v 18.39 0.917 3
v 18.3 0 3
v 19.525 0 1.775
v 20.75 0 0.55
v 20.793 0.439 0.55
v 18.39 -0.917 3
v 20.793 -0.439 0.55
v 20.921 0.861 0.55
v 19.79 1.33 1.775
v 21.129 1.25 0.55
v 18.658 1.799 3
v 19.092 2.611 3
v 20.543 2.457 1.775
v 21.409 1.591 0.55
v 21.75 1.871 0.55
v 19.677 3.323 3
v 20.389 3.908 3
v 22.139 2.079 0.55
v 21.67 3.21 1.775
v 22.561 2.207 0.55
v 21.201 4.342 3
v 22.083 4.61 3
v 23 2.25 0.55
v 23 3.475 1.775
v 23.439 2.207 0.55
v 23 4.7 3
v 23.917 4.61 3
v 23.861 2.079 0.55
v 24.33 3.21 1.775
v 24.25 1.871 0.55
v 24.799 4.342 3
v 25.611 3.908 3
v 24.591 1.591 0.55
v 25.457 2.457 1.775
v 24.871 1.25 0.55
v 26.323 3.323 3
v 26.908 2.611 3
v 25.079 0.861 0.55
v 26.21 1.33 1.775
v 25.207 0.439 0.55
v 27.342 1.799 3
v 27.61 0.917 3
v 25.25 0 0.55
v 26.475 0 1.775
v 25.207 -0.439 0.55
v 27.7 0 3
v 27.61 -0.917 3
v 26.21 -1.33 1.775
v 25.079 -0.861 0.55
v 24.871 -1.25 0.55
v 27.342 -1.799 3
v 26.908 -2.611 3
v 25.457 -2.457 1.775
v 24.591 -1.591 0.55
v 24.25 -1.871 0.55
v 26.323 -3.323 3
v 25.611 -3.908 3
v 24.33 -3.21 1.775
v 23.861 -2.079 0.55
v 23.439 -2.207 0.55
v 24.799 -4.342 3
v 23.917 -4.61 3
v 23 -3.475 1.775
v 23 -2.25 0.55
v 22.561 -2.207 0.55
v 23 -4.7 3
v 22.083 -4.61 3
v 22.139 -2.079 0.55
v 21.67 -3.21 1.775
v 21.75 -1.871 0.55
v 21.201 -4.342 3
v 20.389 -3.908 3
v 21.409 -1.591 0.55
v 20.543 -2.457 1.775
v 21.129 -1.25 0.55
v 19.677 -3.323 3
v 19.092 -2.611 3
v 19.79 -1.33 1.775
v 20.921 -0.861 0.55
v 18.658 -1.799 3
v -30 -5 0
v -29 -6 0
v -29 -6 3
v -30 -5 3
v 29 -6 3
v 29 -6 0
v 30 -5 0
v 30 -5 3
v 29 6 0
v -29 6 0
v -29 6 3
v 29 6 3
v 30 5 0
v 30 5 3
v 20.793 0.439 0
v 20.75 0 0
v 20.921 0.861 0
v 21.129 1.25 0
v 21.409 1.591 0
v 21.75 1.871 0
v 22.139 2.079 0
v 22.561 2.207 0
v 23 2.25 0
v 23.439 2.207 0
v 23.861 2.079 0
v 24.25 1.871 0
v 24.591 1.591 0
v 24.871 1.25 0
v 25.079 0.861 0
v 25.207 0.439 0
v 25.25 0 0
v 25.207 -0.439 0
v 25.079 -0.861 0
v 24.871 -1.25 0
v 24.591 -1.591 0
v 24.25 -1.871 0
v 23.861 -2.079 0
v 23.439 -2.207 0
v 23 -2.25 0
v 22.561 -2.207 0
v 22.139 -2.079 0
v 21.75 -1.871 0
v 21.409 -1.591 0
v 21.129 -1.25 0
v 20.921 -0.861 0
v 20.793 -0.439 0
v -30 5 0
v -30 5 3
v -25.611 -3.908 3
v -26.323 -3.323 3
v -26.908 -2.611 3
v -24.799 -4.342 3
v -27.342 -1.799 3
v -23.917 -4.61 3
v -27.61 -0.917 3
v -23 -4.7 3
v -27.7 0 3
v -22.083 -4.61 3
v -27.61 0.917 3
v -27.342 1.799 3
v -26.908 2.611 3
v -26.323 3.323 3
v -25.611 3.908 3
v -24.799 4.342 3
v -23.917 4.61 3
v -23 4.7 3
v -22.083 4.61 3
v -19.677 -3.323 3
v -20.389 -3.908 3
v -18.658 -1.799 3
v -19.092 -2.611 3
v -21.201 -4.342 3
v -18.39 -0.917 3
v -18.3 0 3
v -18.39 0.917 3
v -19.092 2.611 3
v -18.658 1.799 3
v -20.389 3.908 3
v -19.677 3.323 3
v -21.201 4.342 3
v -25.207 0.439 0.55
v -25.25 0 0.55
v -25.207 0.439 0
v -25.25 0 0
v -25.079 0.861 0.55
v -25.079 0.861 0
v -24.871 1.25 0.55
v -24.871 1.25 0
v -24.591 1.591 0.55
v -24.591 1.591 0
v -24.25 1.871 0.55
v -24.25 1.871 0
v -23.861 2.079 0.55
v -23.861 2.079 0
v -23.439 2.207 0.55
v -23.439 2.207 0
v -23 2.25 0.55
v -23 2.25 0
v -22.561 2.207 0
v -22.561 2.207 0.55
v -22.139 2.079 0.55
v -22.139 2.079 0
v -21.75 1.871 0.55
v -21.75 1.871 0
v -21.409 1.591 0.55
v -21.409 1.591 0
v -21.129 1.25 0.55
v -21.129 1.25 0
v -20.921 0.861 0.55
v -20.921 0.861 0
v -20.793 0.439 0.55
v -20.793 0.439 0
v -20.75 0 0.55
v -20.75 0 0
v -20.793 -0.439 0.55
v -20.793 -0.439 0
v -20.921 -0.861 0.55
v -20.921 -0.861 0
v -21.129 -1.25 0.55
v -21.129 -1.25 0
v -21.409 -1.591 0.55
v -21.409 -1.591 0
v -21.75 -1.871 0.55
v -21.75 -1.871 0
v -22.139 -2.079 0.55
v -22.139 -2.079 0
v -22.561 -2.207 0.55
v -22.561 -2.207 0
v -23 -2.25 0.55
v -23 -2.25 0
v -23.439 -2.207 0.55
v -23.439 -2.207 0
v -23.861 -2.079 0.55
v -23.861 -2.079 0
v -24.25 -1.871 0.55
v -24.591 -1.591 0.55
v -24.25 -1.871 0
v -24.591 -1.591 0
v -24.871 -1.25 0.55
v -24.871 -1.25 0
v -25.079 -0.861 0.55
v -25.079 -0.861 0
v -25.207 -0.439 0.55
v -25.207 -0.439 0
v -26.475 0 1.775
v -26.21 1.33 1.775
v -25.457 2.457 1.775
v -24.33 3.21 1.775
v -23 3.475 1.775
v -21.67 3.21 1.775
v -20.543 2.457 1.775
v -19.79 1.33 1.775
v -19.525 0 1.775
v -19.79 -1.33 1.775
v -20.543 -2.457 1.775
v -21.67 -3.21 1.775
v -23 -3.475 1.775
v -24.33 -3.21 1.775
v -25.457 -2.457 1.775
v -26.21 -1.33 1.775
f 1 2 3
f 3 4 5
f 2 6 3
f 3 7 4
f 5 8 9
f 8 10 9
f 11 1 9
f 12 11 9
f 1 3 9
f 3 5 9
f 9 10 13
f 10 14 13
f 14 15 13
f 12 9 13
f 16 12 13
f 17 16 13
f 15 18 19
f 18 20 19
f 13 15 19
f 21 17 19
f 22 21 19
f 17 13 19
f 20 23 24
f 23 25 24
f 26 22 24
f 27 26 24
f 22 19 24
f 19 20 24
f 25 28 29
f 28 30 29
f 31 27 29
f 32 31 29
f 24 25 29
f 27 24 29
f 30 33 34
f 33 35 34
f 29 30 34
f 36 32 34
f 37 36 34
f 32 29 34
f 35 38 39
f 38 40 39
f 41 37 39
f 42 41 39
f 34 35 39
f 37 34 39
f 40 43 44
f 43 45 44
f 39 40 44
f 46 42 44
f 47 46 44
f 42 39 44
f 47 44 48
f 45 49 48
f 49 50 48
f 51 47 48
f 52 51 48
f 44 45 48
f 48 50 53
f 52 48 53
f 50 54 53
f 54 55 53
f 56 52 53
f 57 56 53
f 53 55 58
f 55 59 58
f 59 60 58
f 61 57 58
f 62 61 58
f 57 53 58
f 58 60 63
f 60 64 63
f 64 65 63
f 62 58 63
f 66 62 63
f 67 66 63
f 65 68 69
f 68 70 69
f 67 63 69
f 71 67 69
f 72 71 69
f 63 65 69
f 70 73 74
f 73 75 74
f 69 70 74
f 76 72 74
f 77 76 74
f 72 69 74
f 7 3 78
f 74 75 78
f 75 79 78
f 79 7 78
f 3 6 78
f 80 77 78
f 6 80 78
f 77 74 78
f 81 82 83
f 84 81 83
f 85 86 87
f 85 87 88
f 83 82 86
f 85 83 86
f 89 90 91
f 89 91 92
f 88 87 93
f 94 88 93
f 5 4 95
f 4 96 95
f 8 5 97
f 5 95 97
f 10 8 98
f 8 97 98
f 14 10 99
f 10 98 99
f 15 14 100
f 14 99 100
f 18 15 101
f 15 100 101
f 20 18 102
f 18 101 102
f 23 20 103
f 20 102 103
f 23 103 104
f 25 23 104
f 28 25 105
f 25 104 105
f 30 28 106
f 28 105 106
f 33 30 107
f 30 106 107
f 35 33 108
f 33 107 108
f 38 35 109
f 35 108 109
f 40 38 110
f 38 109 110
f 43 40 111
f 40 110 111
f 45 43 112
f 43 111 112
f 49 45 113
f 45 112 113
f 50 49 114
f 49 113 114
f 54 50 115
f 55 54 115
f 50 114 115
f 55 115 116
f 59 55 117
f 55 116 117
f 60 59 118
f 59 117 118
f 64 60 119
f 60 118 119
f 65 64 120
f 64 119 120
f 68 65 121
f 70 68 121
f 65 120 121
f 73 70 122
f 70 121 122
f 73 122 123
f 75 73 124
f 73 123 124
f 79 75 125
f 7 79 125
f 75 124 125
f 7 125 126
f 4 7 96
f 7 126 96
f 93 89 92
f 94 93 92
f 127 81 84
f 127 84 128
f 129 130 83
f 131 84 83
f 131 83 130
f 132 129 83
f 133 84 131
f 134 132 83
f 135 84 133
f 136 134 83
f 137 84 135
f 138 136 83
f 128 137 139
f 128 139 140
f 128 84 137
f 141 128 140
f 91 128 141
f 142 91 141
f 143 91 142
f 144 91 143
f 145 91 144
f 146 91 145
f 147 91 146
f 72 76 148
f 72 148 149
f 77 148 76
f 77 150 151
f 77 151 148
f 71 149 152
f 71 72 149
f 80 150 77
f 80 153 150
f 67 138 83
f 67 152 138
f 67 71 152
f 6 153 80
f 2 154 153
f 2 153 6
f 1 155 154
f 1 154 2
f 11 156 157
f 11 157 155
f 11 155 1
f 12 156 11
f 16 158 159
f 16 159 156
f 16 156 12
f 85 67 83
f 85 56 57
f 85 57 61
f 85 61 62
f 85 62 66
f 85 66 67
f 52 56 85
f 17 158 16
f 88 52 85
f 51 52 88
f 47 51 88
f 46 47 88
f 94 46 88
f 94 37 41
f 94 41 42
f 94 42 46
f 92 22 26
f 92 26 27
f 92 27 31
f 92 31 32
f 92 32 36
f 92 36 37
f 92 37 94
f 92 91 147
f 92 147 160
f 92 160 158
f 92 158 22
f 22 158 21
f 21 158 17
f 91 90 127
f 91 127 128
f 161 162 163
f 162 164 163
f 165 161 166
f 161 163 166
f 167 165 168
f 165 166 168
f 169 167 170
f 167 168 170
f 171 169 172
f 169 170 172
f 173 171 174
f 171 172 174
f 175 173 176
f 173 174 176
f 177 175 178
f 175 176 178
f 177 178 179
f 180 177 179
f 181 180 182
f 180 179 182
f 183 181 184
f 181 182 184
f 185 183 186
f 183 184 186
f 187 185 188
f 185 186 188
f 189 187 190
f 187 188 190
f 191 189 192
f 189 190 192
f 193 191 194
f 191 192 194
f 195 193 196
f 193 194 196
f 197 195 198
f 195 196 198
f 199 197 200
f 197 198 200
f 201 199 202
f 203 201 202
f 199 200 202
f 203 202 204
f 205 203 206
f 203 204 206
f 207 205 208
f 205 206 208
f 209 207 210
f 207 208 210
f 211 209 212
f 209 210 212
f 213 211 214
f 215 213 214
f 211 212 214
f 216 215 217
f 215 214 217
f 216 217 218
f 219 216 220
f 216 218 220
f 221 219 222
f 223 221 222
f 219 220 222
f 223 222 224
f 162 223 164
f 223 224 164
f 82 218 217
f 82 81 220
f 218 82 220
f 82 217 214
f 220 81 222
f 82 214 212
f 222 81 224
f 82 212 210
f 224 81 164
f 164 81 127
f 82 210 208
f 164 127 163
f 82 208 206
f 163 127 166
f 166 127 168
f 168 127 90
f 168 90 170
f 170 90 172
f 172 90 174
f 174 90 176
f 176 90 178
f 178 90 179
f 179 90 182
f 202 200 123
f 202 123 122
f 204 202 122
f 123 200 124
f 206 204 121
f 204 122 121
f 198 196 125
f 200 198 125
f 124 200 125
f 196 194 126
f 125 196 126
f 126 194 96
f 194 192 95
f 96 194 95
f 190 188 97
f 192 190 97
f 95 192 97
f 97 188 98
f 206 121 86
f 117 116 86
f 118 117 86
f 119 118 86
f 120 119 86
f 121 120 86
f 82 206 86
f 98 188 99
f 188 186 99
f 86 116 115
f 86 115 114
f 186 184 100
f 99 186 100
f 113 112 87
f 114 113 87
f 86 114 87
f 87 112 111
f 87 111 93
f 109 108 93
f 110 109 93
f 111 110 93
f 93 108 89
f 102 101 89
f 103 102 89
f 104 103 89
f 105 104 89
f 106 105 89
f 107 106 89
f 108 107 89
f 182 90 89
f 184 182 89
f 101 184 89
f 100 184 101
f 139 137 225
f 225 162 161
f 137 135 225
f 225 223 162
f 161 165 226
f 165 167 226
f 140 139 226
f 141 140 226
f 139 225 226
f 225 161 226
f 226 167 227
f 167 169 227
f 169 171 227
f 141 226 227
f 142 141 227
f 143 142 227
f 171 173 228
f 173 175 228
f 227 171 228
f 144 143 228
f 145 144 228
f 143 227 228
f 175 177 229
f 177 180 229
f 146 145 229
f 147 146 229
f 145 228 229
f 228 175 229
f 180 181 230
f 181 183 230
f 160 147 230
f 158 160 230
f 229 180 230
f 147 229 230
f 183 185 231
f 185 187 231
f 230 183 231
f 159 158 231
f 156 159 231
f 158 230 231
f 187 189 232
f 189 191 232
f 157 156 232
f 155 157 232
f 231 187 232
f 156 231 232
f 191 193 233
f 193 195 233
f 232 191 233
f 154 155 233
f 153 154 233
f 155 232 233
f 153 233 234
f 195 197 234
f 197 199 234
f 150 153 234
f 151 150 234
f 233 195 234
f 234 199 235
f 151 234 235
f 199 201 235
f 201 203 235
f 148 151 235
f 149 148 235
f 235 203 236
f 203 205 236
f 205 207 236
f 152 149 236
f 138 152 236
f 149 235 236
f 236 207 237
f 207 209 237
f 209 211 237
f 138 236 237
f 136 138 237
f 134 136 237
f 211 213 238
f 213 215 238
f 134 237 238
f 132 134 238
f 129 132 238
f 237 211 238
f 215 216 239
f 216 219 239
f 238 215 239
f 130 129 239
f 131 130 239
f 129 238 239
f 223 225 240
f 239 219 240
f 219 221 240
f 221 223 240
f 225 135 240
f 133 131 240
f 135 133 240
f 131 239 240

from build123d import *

# Parameters (mm, degrees)
F0_W           = 60
F0_H           = 12
F1_DEPTH       = 3
F3_D           = 4.5
F3_DEPTH       = 3.4
F3_CSINK_D     = 9.4
F3_CSINK_ANGLE = 90
F3_TIP         = 1.3519363928
F4_SIZE        = 1


with BuildPart() as f1:
    # F0 (on Top) → F1 (new body)
    with BuildSketch(Plane.XY):
        Rectangle(F0_W, F0_H)
    extrude(amount=F1_DEPTH)

    # F3
    with Locations(Plane.XY.offset(3)):
        with Locations((-23, 0), (23, 0)):
            CounterSinkHole(F3_D / 2, F3_CSINK_D / 2, depth=F3_DEPTH, counter_sink_angle=F3_CSINK_ANGLE)
            with Locations((0, 0, -(F3_DEPTH + F3_TIP / 2))):  # 118° drill point
                Cone(0, F3_D / 2, F3_TIP, mode=Mode.SUBTRACT)

    # F4
    f4_edges = [f1.edges().sort_by_distance(p)[0] for p in [
        (30, 6, 1.5),
        (30, -6, 1.5),
        (-30, -6, 1.5),
        (-30, 6, 1.5),
    ]]
    chamfer(f4_edges, length=F4_SIZE)


solid = f1.part
